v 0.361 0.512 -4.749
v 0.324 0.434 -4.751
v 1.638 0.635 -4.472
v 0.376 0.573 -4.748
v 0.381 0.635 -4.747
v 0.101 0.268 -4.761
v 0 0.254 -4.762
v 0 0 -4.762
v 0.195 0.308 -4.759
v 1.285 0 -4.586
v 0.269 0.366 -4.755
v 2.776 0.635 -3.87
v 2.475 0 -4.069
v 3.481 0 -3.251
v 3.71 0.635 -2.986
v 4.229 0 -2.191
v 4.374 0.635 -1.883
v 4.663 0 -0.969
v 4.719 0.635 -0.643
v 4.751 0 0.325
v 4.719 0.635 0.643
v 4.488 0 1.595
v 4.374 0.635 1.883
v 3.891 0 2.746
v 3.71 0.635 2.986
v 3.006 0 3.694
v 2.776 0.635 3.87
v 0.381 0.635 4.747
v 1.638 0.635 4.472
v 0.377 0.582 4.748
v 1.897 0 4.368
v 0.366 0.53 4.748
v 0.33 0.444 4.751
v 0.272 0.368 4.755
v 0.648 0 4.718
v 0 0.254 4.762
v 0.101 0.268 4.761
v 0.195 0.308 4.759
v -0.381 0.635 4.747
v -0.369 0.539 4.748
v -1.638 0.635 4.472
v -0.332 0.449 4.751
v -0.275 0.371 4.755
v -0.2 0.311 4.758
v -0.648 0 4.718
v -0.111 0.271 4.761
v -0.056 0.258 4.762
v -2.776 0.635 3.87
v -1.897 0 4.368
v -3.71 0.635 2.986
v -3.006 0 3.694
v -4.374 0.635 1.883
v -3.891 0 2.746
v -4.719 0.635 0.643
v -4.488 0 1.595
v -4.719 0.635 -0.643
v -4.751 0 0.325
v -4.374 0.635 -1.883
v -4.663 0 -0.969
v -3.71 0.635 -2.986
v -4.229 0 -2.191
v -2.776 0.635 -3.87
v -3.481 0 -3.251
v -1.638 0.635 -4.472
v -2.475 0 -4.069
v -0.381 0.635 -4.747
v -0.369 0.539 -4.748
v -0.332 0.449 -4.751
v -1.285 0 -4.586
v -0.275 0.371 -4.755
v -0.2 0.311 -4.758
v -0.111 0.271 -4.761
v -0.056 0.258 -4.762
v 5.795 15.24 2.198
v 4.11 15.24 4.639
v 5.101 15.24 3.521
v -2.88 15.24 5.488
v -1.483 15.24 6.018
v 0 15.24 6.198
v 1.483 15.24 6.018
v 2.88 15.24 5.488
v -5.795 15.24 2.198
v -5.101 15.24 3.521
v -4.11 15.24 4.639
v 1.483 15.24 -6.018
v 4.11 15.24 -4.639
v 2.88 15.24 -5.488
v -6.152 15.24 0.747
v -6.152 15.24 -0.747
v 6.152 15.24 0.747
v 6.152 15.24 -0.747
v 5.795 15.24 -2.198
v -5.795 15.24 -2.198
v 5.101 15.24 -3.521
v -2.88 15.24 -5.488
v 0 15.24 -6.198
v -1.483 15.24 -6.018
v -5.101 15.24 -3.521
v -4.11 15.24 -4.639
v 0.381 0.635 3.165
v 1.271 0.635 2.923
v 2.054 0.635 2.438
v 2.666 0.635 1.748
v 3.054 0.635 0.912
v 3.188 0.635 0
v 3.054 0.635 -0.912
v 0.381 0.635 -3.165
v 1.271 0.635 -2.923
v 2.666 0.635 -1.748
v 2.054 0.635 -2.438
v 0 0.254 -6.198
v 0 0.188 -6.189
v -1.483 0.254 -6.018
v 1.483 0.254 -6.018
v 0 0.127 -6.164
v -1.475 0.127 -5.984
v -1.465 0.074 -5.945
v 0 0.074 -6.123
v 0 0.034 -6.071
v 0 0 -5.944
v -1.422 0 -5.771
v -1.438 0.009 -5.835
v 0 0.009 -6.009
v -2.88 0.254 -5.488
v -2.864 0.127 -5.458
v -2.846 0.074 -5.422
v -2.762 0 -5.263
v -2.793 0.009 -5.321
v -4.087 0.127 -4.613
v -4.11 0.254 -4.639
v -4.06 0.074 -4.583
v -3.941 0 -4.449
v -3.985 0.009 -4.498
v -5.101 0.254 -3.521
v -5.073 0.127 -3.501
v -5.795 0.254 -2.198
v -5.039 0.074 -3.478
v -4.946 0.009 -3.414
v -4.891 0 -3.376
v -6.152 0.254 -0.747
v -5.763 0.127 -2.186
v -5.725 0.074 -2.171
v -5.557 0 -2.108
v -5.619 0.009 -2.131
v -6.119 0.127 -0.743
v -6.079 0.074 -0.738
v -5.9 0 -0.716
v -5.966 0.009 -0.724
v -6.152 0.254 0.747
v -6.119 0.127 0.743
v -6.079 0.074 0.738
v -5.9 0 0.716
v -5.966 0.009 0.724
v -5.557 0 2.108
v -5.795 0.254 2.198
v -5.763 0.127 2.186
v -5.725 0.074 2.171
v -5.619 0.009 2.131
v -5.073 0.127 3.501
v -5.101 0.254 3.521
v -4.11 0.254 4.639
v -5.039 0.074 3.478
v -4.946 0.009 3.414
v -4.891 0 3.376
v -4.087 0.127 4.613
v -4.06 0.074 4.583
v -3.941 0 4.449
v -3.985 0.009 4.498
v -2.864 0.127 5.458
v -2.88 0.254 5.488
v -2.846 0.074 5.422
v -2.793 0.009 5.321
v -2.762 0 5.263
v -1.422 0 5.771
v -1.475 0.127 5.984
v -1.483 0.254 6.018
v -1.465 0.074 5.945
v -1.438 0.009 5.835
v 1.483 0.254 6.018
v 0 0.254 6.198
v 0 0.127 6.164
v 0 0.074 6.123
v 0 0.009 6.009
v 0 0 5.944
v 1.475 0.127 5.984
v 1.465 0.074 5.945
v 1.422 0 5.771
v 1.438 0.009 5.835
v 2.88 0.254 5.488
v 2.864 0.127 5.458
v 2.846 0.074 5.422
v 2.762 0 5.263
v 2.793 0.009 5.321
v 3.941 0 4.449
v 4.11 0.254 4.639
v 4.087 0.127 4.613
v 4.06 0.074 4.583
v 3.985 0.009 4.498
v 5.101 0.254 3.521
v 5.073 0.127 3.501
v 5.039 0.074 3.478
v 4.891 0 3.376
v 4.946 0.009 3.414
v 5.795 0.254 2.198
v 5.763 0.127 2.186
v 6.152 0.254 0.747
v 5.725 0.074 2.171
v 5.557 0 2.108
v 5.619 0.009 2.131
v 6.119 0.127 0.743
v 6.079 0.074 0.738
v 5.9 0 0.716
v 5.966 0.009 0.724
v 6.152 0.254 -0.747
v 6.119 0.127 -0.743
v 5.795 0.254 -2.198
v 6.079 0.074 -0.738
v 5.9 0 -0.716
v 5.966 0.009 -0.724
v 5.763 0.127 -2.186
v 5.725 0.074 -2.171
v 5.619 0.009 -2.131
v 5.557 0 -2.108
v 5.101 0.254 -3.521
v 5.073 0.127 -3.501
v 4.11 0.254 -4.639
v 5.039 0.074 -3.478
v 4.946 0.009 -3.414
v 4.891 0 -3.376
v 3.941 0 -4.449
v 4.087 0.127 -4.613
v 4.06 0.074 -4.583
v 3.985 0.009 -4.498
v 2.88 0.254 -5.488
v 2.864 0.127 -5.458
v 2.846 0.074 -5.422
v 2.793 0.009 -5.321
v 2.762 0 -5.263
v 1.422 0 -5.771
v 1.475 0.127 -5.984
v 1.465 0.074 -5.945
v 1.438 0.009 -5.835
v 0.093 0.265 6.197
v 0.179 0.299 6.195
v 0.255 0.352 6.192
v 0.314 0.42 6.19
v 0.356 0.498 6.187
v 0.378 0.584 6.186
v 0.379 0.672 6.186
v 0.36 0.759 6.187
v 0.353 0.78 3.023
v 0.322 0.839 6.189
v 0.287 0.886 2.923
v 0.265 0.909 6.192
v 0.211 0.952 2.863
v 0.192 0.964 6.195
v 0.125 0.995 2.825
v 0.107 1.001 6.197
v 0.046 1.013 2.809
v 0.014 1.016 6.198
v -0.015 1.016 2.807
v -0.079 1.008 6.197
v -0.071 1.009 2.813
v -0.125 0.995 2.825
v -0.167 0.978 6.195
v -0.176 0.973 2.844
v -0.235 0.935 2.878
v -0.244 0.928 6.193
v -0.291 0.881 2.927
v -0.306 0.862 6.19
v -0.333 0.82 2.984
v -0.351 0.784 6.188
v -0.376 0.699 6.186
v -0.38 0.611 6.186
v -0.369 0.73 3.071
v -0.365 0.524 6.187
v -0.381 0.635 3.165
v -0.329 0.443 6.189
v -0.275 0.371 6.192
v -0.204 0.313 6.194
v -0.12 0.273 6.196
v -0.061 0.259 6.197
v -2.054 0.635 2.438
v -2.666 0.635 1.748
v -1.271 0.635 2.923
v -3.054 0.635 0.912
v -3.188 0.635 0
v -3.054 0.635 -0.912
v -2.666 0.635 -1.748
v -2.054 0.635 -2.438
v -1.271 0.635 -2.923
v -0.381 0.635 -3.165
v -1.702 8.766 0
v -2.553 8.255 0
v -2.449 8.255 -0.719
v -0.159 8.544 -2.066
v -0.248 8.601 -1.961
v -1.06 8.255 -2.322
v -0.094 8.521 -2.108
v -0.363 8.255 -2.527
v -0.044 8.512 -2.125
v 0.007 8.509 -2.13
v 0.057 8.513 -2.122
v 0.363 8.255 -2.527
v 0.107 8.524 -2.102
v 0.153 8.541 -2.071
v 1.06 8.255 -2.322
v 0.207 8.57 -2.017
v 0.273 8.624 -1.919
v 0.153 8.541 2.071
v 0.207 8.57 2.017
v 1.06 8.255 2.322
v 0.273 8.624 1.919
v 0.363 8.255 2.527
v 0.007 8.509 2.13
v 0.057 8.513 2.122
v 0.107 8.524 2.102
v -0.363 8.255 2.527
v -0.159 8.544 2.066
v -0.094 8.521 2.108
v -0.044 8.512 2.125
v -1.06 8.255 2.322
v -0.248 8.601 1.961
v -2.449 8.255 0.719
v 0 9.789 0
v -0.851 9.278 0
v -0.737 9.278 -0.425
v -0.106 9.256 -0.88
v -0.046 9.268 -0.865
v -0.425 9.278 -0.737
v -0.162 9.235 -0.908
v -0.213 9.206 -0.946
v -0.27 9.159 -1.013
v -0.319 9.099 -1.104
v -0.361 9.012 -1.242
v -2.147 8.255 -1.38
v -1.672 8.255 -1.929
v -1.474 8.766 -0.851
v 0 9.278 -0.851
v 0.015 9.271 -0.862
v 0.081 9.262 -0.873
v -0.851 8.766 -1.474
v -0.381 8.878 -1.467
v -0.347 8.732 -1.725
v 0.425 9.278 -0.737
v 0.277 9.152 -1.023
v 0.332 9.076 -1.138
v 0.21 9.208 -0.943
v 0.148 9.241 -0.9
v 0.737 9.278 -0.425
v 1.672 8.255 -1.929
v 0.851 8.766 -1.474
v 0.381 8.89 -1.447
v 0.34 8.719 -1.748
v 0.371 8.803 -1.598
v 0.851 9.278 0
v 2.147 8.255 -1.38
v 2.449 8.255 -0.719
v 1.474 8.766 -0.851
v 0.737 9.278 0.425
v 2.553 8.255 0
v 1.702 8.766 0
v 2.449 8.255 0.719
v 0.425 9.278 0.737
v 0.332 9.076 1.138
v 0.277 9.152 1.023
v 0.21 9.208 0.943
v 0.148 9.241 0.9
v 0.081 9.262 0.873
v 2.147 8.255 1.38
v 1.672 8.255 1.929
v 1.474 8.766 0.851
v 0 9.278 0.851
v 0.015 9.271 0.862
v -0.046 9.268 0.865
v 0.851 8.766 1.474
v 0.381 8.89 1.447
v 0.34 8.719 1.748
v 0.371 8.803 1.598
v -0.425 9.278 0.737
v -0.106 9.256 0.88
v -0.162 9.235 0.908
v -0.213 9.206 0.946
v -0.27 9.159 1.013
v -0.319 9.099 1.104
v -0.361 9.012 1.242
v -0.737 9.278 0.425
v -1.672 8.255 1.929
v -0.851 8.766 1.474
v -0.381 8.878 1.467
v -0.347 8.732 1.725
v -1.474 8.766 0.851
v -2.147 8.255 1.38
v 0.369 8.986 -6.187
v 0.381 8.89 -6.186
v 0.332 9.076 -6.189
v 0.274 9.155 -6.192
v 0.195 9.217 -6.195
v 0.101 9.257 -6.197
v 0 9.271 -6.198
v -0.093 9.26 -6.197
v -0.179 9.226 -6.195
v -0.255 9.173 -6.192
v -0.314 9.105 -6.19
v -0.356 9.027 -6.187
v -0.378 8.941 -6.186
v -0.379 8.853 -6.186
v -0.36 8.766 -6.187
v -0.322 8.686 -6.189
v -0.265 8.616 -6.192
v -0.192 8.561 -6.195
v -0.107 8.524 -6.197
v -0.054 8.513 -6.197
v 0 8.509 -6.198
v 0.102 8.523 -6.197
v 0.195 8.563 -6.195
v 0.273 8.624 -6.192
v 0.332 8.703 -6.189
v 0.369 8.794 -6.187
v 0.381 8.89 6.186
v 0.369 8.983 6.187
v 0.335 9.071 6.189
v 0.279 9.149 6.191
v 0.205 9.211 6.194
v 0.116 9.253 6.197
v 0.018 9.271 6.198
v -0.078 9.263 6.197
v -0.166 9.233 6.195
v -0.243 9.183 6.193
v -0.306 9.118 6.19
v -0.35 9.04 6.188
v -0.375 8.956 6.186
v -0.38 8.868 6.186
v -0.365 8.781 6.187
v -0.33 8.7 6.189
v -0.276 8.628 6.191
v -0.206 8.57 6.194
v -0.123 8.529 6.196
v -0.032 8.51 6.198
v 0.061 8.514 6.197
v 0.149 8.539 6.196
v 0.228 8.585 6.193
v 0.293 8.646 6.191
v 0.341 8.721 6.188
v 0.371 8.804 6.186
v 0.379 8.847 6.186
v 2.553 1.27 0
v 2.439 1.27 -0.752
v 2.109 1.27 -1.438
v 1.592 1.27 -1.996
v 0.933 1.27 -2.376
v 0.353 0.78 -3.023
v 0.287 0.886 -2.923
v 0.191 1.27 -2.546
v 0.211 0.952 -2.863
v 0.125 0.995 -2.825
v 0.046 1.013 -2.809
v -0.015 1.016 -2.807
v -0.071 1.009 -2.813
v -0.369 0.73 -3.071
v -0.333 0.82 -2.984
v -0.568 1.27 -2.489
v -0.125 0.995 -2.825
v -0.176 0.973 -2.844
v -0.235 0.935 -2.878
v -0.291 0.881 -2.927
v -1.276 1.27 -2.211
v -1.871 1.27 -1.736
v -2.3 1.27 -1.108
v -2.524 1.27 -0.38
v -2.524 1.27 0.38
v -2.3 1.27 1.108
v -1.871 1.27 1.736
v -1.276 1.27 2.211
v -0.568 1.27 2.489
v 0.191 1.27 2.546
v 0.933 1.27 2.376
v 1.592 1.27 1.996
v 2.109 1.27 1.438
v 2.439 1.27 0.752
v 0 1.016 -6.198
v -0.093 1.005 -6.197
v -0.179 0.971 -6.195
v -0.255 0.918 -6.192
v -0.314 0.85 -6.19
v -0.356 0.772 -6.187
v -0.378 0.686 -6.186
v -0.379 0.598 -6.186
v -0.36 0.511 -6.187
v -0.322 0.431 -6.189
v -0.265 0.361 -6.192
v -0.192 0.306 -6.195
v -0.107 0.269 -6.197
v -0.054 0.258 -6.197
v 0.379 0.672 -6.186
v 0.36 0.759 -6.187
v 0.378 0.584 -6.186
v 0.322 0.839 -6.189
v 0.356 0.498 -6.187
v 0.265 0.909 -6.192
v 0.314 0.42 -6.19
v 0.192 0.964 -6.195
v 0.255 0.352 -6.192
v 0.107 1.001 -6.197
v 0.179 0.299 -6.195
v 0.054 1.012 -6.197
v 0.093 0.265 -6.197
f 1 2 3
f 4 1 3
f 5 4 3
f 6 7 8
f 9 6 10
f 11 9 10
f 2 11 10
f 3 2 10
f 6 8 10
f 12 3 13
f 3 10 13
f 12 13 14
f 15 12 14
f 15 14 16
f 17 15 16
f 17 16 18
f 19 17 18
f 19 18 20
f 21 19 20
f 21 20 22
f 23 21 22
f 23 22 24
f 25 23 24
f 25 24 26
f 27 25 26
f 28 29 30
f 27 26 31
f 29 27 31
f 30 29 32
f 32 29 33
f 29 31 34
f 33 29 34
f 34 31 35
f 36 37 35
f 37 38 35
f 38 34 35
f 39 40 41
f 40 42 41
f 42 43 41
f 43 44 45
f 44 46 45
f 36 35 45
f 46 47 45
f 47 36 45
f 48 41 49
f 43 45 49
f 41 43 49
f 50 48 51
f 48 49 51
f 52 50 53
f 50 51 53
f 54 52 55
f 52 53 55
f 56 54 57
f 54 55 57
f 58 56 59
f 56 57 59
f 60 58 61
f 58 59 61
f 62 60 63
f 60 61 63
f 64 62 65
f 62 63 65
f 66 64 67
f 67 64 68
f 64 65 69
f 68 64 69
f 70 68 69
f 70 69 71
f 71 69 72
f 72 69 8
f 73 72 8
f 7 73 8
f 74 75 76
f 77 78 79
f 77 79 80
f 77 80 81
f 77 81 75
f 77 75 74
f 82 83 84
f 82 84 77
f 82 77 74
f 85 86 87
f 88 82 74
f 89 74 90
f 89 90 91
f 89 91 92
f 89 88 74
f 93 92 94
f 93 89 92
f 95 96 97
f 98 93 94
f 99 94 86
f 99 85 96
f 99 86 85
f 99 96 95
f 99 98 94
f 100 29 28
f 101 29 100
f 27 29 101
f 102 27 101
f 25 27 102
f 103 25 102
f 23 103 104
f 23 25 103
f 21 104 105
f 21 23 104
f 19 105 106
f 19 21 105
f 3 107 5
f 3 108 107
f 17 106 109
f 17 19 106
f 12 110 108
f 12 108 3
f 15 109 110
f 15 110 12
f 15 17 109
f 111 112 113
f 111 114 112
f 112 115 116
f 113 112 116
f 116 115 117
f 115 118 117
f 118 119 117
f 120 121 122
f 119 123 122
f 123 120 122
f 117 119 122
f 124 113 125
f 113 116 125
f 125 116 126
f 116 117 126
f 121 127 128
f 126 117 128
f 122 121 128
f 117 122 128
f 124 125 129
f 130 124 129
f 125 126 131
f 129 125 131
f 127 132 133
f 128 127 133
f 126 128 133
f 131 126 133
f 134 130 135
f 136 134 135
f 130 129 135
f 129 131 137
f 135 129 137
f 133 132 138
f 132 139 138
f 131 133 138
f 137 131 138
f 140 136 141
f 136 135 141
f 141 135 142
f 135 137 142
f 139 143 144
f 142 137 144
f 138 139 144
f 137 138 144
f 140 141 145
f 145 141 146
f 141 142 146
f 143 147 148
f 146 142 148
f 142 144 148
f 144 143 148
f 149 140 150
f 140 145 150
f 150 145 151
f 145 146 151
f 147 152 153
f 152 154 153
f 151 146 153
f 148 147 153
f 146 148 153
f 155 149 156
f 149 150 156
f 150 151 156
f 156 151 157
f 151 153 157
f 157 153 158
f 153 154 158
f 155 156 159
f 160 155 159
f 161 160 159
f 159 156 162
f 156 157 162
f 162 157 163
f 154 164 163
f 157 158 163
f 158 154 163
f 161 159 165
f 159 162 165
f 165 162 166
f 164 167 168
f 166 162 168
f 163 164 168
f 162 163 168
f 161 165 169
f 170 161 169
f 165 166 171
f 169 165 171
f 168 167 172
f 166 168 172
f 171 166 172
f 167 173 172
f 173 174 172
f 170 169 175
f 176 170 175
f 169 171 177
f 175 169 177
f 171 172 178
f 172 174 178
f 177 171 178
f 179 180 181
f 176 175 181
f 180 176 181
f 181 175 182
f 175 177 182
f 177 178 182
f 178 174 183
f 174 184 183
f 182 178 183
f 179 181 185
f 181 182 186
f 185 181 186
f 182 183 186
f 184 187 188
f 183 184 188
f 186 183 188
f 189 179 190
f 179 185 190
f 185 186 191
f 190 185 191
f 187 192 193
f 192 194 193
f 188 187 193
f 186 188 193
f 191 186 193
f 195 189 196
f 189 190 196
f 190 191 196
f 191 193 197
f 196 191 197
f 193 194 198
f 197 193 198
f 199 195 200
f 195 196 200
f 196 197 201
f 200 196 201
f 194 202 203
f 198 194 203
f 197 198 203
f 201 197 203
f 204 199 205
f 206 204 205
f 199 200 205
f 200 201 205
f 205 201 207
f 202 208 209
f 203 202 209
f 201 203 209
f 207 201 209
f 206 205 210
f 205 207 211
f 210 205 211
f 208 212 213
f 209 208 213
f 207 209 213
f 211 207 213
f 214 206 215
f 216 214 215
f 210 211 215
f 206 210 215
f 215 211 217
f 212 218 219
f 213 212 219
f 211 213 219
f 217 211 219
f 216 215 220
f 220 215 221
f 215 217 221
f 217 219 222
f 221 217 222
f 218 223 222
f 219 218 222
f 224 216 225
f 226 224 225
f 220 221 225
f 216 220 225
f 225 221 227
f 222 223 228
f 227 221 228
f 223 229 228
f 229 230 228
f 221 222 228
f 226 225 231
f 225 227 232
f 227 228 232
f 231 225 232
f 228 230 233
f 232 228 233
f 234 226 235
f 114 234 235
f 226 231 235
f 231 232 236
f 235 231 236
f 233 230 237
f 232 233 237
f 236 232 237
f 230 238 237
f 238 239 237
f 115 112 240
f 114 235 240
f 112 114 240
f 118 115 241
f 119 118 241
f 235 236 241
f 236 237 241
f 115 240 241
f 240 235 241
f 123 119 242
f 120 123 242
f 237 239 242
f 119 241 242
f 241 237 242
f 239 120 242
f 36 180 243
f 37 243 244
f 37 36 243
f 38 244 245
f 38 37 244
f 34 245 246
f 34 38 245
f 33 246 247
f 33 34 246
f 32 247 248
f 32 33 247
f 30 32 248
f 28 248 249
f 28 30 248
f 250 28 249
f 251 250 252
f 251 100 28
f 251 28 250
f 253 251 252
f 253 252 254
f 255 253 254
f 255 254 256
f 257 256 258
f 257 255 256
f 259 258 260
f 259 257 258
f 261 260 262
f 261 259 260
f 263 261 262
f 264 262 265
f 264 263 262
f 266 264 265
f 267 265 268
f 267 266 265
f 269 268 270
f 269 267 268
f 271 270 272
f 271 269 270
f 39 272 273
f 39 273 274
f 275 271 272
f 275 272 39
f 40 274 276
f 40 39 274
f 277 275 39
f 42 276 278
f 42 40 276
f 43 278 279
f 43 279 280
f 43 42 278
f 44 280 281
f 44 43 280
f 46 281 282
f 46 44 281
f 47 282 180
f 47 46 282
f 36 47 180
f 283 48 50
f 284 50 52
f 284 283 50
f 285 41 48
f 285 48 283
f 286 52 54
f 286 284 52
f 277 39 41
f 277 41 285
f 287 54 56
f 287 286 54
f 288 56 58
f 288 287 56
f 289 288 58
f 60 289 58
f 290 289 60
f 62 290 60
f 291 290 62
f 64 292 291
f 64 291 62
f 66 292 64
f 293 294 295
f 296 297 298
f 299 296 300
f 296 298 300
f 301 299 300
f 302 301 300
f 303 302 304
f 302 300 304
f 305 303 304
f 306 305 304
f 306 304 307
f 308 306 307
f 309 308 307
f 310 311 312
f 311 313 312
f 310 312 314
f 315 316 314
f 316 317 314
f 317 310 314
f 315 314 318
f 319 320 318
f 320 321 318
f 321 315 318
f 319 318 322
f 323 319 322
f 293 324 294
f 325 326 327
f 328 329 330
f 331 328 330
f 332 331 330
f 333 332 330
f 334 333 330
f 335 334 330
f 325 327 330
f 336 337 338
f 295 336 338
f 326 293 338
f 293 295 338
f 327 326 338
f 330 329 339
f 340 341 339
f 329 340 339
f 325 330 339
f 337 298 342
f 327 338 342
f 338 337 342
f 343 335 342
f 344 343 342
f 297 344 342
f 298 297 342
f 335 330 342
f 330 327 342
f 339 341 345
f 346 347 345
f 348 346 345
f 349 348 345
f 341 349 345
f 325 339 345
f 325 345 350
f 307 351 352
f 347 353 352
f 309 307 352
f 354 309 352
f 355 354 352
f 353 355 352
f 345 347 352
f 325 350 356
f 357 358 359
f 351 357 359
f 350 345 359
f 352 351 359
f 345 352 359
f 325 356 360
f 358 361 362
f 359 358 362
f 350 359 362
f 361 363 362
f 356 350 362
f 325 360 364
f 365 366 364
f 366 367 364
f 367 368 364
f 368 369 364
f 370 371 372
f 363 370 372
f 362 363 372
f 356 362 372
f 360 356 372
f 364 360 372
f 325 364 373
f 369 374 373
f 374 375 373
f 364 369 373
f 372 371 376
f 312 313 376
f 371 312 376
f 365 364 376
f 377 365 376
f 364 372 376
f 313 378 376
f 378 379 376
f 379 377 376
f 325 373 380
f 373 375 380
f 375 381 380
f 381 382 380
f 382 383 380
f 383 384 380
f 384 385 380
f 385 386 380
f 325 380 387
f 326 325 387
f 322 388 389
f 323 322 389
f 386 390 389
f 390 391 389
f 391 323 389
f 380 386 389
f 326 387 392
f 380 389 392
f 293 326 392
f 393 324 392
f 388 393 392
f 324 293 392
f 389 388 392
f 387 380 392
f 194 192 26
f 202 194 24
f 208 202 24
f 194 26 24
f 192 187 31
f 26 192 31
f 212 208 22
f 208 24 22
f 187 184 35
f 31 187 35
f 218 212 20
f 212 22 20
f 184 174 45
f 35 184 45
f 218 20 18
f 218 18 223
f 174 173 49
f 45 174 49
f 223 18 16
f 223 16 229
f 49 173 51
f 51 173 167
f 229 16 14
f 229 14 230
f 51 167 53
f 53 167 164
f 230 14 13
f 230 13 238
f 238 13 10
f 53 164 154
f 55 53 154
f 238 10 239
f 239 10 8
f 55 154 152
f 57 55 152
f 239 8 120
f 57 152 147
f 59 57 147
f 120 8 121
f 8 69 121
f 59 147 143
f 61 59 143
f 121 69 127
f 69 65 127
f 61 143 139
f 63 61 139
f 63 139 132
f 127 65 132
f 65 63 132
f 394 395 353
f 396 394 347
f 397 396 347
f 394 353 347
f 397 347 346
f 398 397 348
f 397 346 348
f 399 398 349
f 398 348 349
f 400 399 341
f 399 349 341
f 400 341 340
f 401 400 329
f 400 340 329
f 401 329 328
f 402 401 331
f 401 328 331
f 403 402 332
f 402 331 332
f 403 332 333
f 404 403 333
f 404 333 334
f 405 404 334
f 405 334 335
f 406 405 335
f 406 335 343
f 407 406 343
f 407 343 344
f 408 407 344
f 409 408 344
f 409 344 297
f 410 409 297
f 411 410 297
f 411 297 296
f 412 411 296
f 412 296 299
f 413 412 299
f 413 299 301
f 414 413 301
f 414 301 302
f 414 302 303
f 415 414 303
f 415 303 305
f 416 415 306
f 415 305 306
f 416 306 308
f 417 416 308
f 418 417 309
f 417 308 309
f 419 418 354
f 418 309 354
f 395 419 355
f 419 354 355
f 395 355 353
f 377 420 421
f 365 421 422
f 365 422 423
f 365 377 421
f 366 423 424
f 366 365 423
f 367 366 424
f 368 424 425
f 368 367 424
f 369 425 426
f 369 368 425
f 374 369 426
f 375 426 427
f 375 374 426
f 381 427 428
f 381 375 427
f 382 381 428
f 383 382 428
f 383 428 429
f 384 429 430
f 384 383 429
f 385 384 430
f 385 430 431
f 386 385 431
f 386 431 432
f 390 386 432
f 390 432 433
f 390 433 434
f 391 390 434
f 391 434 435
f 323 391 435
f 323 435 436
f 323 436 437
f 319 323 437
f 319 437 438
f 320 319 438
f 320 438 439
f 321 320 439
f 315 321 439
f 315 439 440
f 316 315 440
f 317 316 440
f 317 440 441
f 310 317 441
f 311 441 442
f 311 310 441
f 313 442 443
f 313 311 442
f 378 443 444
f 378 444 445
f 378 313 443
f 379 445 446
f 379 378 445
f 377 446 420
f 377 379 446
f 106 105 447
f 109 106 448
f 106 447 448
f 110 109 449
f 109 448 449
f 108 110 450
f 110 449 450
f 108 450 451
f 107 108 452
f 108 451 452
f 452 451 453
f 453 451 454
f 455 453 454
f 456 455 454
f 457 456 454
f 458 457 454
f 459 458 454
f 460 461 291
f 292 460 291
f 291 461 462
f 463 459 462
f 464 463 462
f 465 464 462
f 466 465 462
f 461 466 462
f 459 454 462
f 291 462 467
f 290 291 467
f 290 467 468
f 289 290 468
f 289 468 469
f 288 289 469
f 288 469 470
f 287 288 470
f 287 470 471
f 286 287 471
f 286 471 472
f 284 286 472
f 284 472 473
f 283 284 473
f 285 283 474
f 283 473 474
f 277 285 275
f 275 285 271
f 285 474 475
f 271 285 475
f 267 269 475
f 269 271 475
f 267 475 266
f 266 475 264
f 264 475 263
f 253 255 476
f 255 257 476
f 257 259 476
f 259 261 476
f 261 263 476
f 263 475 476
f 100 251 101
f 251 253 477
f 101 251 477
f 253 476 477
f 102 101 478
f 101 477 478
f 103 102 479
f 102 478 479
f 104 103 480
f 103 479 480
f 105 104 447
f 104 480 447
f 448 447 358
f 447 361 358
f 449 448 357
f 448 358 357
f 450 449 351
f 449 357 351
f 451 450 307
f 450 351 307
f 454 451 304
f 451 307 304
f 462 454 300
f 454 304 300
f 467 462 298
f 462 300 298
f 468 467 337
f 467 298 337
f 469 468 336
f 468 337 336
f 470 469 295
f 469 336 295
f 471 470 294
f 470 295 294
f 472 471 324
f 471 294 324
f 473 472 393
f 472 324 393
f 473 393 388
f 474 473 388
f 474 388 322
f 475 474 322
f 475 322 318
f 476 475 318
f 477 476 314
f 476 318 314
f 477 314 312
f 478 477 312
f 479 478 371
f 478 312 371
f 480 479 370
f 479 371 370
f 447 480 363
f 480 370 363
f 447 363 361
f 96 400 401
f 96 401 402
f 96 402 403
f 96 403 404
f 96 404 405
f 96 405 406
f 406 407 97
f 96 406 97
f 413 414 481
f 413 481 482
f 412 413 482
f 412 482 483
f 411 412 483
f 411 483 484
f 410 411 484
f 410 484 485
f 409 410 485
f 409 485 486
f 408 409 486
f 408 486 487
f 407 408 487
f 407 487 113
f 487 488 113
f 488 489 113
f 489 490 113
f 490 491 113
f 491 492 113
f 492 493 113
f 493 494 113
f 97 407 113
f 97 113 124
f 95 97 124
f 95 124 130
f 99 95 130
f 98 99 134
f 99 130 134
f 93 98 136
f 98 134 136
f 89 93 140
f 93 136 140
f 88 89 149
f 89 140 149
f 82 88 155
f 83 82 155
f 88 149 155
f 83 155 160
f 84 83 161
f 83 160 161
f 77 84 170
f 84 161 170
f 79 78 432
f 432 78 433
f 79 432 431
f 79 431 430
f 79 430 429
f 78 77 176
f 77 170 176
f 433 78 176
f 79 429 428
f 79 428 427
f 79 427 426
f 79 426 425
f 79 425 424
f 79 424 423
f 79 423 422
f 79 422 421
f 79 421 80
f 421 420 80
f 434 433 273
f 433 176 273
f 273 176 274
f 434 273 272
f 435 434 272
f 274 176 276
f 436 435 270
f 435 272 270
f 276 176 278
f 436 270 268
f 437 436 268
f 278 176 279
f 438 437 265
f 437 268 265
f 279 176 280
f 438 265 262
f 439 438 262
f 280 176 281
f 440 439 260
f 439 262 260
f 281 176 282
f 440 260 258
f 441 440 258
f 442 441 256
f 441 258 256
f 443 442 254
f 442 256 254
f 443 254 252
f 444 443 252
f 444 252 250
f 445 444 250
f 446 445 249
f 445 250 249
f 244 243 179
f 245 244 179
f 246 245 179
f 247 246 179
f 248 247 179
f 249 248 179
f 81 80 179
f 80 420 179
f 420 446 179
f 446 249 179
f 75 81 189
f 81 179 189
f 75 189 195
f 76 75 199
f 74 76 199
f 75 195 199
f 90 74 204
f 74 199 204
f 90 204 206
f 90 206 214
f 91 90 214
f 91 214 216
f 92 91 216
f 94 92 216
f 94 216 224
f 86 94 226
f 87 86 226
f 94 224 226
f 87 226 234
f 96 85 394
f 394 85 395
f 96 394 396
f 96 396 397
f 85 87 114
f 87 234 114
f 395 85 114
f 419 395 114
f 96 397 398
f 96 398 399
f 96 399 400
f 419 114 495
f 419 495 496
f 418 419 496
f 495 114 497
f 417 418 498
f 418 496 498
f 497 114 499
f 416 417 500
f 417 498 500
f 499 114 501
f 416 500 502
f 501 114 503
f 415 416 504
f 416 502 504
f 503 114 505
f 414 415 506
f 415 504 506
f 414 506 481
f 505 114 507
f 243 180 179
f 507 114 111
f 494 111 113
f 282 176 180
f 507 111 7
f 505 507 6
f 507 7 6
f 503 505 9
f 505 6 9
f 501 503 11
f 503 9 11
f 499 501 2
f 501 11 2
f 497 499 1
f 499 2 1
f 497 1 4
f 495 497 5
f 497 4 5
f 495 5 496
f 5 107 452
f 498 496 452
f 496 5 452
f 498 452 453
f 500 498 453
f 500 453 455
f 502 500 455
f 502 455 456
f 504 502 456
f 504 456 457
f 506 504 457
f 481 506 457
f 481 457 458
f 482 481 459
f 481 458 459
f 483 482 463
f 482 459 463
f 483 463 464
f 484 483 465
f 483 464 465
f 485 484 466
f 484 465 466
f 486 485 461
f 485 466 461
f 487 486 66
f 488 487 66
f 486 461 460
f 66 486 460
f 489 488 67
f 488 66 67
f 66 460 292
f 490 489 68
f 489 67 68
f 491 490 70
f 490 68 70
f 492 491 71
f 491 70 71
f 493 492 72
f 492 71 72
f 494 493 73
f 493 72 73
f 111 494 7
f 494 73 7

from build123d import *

# Parameters (mm, degrees)
SKETCH1_R                         = 6.1976
BOSS_EXTRUDE1_DEPTH               = 15.24
SKETCH2_R                         = 4.7625
CUT_EXTRUDE1_DEPTH                = 0.635
F_1_4_20_TAPPED_HOLE1_D           = 5.1054
F_1_4_20_TAPPED_HOLE1_DEPTH       = 7.62
F_1_4_20_TAPPED_HOLE1_CSINK_D     = 6.3754
F_1_4_20_TAPPED_HOLE1_CSINK_ANGLE = 90
F_1_4_20_TAPPED_HOLE1_TIP         = 1.533816902
FILLET4_R                         = 0.254
SKETCH7_R                         = 0.381
CUT_EXTRUDE2_DEPTH                = 18.580616962
CUT_EXTRUDE2_DEPTH_BACK           = 18.580616962


with BuildPart() as part:
    # Sketch1 → Boss-Extrude1 (new body)
    with BuildSketch(Plane(origin=(0, 0, 0), x_dir=(1, 0, 0), z_dir=(0, 1, 0))):
        with Locations(Location((0, 0, 0), (0, 0, 90))):
            Circle(SKETCH1_R)
    extrude(amount=BOSS_EXTRUDE1_DEPTH)

    # Sketch2 → Cut-Extrude1 (cut)
    with BuildSketch(Plane.XZ):
        with Locations(Location((0, 0, 0), (0, 0, 270))):
            Circle(SKETCH2_R)
    extrude(amount=-CUT_EXTRUDE1_DEPTH, mode=Mode.SUBTRACT)

    # 1/4-20 Tapped Hole1
    with Locations(Plane(origin=(0, 0.635, 0), x_dir=(-1, 0, 0), z_dir=(0, -1, 0))):
        with Locations((0, 0)):
            CounterSinkHole(F_1_4_20_TAPPED_HOLE1_D / 2, F_1_4_20_TAPPED_HOLE1_CSINK_D / 2, depth=F_1_4_20_TAPPED_HOLE1_DEPTH, counter_sink_angle=F_1_4_20_TAPPED_HOLE1_CSINK_ANGLE)
            with Locations((0, 0, -(F_1_4_20_TAPPED_HOLE1_DEPTH + F_1_4_20_TAPPED_HOLE1_TIP / 2))):  # 118° drill point
                Cone(0, F_1_4_20_TAPPED_HOLE1_D / 2, F_1_4_20_TAPPED_HOLE1_TIP, mode=Mode.SUBTRACT)

    # Fillet4
    fillet4_edges = [part.edges().sort_by_distance(p)[0] for p in [
        (0, 0, 6.1976),
    ]]
    fillet(fillet4_edges, radius=FILLET4_R)

    # Sketch7 → Cut-Extrude2 (cut, two sides)
    with BuildSketch(Plane.XY) as cut_extrude2_sk:
        with Locations(Location((0, 0.635, 0), (0, 0, 270))):
            Circle(SKETCH7_R)
        with Locations((0, 8.89)):
            Circle(SKETCH7_R)
    extrude(amount=CUT_EXTRUDE2_DEPTH, mode=Mode.SUBTRACT)
    extrude(cut_extrude2_sk.sketch, amount=-CUT_EXTRUDE2_DEPTH_BACK, mode=Mode.SUBTRACT)


solid = part.part
